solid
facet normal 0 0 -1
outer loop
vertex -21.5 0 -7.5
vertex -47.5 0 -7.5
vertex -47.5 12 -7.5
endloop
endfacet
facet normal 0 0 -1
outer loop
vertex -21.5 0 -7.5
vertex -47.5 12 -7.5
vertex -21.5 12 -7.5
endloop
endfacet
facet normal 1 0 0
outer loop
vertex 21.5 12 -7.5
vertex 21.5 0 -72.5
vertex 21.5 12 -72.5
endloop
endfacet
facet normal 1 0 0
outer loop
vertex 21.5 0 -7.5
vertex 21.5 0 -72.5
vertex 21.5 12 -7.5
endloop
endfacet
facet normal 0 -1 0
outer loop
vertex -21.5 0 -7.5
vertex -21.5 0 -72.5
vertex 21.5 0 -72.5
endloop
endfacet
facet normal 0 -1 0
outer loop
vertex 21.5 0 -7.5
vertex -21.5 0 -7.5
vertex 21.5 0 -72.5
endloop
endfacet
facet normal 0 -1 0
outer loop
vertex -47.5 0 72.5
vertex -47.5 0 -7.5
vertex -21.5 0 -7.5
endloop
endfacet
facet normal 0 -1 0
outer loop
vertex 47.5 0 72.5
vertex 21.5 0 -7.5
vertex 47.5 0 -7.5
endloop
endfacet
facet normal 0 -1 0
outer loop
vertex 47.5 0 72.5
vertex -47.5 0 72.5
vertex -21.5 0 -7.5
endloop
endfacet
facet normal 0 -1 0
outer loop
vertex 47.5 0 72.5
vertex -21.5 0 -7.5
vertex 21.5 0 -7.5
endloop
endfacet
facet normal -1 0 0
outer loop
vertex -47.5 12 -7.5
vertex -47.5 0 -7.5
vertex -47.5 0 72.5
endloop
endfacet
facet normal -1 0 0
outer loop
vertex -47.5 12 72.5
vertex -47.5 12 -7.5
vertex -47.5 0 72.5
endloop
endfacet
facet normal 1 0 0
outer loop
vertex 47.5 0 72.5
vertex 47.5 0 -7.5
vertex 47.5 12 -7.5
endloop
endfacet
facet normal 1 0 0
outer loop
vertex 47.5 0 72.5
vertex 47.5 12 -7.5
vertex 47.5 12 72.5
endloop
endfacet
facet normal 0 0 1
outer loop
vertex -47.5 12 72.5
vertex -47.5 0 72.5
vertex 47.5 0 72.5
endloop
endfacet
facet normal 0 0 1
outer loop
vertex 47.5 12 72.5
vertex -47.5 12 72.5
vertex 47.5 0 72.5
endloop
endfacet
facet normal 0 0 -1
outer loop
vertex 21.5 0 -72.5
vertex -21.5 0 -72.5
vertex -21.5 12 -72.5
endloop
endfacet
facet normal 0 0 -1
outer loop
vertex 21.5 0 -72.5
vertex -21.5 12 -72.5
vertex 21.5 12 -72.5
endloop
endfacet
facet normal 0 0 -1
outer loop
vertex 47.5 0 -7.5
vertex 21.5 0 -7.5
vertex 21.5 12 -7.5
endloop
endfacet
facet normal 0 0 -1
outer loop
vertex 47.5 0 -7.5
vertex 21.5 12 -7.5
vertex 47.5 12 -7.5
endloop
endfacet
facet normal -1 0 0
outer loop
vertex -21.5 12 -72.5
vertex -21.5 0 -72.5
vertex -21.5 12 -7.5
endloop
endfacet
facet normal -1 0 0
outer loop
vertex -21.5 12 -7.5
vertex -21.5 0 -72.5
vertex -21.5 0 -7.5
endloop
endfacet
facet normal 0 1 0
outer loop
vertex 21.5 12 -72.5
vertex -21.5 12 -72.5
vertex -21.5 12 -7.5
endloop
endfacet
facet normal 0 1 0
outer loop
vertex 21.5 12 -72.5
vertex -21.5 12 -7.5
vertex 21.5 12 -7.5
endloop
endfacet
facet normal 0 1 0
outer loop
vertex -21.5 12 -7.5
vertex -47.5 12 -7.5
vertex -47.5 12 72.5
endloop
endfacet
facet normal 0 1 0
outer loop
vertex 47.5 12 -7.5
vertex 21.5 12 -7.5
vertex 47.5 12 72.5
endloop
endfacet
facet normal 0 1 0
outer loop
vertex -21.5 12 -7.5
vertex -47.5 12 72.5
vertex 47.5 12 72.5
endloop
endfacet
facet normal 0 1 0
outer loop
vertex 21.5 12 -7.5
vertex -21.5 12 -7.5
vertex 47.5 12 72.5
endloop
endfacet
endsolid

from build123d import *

# Parameters (mm, degrees)
F0_W     = 95
F0_H     = 145
F1_DEPTH = 12
F2_W     = 26
F2_H     = 65
F3_DEPTH = 15
F4_W     = 26
F4_H     = 65
F5_DEPTH = 15


with BuildPart() as f1:
    # F0 (on Front) → F1 (new body)
    with BuildSketch(Plane.XZ):
        Rectangle(F0_W, F0_H)
    extrude(amount=-F1_DEPTH)

    # F2 (on face) → F3 (cut)
    with BuildSketch(Plane.XZ):
        with Locations((34.5, -40)):
            Rectangle(F2_W, F2_H)
    extrude(amount=-F3_DEPTH, mode=Mode.SUBTRACT)

    # F4 (on face) → F5 (cut)
    with BuildSketch(Plane.XZ):
        with Locations((-34.5, -40)):
            Rectangle(F4_W, F4_H)
    extrude(amount=-F5_DEPTH, mode=Mode.SUBTRACT)


solid = f1.part
